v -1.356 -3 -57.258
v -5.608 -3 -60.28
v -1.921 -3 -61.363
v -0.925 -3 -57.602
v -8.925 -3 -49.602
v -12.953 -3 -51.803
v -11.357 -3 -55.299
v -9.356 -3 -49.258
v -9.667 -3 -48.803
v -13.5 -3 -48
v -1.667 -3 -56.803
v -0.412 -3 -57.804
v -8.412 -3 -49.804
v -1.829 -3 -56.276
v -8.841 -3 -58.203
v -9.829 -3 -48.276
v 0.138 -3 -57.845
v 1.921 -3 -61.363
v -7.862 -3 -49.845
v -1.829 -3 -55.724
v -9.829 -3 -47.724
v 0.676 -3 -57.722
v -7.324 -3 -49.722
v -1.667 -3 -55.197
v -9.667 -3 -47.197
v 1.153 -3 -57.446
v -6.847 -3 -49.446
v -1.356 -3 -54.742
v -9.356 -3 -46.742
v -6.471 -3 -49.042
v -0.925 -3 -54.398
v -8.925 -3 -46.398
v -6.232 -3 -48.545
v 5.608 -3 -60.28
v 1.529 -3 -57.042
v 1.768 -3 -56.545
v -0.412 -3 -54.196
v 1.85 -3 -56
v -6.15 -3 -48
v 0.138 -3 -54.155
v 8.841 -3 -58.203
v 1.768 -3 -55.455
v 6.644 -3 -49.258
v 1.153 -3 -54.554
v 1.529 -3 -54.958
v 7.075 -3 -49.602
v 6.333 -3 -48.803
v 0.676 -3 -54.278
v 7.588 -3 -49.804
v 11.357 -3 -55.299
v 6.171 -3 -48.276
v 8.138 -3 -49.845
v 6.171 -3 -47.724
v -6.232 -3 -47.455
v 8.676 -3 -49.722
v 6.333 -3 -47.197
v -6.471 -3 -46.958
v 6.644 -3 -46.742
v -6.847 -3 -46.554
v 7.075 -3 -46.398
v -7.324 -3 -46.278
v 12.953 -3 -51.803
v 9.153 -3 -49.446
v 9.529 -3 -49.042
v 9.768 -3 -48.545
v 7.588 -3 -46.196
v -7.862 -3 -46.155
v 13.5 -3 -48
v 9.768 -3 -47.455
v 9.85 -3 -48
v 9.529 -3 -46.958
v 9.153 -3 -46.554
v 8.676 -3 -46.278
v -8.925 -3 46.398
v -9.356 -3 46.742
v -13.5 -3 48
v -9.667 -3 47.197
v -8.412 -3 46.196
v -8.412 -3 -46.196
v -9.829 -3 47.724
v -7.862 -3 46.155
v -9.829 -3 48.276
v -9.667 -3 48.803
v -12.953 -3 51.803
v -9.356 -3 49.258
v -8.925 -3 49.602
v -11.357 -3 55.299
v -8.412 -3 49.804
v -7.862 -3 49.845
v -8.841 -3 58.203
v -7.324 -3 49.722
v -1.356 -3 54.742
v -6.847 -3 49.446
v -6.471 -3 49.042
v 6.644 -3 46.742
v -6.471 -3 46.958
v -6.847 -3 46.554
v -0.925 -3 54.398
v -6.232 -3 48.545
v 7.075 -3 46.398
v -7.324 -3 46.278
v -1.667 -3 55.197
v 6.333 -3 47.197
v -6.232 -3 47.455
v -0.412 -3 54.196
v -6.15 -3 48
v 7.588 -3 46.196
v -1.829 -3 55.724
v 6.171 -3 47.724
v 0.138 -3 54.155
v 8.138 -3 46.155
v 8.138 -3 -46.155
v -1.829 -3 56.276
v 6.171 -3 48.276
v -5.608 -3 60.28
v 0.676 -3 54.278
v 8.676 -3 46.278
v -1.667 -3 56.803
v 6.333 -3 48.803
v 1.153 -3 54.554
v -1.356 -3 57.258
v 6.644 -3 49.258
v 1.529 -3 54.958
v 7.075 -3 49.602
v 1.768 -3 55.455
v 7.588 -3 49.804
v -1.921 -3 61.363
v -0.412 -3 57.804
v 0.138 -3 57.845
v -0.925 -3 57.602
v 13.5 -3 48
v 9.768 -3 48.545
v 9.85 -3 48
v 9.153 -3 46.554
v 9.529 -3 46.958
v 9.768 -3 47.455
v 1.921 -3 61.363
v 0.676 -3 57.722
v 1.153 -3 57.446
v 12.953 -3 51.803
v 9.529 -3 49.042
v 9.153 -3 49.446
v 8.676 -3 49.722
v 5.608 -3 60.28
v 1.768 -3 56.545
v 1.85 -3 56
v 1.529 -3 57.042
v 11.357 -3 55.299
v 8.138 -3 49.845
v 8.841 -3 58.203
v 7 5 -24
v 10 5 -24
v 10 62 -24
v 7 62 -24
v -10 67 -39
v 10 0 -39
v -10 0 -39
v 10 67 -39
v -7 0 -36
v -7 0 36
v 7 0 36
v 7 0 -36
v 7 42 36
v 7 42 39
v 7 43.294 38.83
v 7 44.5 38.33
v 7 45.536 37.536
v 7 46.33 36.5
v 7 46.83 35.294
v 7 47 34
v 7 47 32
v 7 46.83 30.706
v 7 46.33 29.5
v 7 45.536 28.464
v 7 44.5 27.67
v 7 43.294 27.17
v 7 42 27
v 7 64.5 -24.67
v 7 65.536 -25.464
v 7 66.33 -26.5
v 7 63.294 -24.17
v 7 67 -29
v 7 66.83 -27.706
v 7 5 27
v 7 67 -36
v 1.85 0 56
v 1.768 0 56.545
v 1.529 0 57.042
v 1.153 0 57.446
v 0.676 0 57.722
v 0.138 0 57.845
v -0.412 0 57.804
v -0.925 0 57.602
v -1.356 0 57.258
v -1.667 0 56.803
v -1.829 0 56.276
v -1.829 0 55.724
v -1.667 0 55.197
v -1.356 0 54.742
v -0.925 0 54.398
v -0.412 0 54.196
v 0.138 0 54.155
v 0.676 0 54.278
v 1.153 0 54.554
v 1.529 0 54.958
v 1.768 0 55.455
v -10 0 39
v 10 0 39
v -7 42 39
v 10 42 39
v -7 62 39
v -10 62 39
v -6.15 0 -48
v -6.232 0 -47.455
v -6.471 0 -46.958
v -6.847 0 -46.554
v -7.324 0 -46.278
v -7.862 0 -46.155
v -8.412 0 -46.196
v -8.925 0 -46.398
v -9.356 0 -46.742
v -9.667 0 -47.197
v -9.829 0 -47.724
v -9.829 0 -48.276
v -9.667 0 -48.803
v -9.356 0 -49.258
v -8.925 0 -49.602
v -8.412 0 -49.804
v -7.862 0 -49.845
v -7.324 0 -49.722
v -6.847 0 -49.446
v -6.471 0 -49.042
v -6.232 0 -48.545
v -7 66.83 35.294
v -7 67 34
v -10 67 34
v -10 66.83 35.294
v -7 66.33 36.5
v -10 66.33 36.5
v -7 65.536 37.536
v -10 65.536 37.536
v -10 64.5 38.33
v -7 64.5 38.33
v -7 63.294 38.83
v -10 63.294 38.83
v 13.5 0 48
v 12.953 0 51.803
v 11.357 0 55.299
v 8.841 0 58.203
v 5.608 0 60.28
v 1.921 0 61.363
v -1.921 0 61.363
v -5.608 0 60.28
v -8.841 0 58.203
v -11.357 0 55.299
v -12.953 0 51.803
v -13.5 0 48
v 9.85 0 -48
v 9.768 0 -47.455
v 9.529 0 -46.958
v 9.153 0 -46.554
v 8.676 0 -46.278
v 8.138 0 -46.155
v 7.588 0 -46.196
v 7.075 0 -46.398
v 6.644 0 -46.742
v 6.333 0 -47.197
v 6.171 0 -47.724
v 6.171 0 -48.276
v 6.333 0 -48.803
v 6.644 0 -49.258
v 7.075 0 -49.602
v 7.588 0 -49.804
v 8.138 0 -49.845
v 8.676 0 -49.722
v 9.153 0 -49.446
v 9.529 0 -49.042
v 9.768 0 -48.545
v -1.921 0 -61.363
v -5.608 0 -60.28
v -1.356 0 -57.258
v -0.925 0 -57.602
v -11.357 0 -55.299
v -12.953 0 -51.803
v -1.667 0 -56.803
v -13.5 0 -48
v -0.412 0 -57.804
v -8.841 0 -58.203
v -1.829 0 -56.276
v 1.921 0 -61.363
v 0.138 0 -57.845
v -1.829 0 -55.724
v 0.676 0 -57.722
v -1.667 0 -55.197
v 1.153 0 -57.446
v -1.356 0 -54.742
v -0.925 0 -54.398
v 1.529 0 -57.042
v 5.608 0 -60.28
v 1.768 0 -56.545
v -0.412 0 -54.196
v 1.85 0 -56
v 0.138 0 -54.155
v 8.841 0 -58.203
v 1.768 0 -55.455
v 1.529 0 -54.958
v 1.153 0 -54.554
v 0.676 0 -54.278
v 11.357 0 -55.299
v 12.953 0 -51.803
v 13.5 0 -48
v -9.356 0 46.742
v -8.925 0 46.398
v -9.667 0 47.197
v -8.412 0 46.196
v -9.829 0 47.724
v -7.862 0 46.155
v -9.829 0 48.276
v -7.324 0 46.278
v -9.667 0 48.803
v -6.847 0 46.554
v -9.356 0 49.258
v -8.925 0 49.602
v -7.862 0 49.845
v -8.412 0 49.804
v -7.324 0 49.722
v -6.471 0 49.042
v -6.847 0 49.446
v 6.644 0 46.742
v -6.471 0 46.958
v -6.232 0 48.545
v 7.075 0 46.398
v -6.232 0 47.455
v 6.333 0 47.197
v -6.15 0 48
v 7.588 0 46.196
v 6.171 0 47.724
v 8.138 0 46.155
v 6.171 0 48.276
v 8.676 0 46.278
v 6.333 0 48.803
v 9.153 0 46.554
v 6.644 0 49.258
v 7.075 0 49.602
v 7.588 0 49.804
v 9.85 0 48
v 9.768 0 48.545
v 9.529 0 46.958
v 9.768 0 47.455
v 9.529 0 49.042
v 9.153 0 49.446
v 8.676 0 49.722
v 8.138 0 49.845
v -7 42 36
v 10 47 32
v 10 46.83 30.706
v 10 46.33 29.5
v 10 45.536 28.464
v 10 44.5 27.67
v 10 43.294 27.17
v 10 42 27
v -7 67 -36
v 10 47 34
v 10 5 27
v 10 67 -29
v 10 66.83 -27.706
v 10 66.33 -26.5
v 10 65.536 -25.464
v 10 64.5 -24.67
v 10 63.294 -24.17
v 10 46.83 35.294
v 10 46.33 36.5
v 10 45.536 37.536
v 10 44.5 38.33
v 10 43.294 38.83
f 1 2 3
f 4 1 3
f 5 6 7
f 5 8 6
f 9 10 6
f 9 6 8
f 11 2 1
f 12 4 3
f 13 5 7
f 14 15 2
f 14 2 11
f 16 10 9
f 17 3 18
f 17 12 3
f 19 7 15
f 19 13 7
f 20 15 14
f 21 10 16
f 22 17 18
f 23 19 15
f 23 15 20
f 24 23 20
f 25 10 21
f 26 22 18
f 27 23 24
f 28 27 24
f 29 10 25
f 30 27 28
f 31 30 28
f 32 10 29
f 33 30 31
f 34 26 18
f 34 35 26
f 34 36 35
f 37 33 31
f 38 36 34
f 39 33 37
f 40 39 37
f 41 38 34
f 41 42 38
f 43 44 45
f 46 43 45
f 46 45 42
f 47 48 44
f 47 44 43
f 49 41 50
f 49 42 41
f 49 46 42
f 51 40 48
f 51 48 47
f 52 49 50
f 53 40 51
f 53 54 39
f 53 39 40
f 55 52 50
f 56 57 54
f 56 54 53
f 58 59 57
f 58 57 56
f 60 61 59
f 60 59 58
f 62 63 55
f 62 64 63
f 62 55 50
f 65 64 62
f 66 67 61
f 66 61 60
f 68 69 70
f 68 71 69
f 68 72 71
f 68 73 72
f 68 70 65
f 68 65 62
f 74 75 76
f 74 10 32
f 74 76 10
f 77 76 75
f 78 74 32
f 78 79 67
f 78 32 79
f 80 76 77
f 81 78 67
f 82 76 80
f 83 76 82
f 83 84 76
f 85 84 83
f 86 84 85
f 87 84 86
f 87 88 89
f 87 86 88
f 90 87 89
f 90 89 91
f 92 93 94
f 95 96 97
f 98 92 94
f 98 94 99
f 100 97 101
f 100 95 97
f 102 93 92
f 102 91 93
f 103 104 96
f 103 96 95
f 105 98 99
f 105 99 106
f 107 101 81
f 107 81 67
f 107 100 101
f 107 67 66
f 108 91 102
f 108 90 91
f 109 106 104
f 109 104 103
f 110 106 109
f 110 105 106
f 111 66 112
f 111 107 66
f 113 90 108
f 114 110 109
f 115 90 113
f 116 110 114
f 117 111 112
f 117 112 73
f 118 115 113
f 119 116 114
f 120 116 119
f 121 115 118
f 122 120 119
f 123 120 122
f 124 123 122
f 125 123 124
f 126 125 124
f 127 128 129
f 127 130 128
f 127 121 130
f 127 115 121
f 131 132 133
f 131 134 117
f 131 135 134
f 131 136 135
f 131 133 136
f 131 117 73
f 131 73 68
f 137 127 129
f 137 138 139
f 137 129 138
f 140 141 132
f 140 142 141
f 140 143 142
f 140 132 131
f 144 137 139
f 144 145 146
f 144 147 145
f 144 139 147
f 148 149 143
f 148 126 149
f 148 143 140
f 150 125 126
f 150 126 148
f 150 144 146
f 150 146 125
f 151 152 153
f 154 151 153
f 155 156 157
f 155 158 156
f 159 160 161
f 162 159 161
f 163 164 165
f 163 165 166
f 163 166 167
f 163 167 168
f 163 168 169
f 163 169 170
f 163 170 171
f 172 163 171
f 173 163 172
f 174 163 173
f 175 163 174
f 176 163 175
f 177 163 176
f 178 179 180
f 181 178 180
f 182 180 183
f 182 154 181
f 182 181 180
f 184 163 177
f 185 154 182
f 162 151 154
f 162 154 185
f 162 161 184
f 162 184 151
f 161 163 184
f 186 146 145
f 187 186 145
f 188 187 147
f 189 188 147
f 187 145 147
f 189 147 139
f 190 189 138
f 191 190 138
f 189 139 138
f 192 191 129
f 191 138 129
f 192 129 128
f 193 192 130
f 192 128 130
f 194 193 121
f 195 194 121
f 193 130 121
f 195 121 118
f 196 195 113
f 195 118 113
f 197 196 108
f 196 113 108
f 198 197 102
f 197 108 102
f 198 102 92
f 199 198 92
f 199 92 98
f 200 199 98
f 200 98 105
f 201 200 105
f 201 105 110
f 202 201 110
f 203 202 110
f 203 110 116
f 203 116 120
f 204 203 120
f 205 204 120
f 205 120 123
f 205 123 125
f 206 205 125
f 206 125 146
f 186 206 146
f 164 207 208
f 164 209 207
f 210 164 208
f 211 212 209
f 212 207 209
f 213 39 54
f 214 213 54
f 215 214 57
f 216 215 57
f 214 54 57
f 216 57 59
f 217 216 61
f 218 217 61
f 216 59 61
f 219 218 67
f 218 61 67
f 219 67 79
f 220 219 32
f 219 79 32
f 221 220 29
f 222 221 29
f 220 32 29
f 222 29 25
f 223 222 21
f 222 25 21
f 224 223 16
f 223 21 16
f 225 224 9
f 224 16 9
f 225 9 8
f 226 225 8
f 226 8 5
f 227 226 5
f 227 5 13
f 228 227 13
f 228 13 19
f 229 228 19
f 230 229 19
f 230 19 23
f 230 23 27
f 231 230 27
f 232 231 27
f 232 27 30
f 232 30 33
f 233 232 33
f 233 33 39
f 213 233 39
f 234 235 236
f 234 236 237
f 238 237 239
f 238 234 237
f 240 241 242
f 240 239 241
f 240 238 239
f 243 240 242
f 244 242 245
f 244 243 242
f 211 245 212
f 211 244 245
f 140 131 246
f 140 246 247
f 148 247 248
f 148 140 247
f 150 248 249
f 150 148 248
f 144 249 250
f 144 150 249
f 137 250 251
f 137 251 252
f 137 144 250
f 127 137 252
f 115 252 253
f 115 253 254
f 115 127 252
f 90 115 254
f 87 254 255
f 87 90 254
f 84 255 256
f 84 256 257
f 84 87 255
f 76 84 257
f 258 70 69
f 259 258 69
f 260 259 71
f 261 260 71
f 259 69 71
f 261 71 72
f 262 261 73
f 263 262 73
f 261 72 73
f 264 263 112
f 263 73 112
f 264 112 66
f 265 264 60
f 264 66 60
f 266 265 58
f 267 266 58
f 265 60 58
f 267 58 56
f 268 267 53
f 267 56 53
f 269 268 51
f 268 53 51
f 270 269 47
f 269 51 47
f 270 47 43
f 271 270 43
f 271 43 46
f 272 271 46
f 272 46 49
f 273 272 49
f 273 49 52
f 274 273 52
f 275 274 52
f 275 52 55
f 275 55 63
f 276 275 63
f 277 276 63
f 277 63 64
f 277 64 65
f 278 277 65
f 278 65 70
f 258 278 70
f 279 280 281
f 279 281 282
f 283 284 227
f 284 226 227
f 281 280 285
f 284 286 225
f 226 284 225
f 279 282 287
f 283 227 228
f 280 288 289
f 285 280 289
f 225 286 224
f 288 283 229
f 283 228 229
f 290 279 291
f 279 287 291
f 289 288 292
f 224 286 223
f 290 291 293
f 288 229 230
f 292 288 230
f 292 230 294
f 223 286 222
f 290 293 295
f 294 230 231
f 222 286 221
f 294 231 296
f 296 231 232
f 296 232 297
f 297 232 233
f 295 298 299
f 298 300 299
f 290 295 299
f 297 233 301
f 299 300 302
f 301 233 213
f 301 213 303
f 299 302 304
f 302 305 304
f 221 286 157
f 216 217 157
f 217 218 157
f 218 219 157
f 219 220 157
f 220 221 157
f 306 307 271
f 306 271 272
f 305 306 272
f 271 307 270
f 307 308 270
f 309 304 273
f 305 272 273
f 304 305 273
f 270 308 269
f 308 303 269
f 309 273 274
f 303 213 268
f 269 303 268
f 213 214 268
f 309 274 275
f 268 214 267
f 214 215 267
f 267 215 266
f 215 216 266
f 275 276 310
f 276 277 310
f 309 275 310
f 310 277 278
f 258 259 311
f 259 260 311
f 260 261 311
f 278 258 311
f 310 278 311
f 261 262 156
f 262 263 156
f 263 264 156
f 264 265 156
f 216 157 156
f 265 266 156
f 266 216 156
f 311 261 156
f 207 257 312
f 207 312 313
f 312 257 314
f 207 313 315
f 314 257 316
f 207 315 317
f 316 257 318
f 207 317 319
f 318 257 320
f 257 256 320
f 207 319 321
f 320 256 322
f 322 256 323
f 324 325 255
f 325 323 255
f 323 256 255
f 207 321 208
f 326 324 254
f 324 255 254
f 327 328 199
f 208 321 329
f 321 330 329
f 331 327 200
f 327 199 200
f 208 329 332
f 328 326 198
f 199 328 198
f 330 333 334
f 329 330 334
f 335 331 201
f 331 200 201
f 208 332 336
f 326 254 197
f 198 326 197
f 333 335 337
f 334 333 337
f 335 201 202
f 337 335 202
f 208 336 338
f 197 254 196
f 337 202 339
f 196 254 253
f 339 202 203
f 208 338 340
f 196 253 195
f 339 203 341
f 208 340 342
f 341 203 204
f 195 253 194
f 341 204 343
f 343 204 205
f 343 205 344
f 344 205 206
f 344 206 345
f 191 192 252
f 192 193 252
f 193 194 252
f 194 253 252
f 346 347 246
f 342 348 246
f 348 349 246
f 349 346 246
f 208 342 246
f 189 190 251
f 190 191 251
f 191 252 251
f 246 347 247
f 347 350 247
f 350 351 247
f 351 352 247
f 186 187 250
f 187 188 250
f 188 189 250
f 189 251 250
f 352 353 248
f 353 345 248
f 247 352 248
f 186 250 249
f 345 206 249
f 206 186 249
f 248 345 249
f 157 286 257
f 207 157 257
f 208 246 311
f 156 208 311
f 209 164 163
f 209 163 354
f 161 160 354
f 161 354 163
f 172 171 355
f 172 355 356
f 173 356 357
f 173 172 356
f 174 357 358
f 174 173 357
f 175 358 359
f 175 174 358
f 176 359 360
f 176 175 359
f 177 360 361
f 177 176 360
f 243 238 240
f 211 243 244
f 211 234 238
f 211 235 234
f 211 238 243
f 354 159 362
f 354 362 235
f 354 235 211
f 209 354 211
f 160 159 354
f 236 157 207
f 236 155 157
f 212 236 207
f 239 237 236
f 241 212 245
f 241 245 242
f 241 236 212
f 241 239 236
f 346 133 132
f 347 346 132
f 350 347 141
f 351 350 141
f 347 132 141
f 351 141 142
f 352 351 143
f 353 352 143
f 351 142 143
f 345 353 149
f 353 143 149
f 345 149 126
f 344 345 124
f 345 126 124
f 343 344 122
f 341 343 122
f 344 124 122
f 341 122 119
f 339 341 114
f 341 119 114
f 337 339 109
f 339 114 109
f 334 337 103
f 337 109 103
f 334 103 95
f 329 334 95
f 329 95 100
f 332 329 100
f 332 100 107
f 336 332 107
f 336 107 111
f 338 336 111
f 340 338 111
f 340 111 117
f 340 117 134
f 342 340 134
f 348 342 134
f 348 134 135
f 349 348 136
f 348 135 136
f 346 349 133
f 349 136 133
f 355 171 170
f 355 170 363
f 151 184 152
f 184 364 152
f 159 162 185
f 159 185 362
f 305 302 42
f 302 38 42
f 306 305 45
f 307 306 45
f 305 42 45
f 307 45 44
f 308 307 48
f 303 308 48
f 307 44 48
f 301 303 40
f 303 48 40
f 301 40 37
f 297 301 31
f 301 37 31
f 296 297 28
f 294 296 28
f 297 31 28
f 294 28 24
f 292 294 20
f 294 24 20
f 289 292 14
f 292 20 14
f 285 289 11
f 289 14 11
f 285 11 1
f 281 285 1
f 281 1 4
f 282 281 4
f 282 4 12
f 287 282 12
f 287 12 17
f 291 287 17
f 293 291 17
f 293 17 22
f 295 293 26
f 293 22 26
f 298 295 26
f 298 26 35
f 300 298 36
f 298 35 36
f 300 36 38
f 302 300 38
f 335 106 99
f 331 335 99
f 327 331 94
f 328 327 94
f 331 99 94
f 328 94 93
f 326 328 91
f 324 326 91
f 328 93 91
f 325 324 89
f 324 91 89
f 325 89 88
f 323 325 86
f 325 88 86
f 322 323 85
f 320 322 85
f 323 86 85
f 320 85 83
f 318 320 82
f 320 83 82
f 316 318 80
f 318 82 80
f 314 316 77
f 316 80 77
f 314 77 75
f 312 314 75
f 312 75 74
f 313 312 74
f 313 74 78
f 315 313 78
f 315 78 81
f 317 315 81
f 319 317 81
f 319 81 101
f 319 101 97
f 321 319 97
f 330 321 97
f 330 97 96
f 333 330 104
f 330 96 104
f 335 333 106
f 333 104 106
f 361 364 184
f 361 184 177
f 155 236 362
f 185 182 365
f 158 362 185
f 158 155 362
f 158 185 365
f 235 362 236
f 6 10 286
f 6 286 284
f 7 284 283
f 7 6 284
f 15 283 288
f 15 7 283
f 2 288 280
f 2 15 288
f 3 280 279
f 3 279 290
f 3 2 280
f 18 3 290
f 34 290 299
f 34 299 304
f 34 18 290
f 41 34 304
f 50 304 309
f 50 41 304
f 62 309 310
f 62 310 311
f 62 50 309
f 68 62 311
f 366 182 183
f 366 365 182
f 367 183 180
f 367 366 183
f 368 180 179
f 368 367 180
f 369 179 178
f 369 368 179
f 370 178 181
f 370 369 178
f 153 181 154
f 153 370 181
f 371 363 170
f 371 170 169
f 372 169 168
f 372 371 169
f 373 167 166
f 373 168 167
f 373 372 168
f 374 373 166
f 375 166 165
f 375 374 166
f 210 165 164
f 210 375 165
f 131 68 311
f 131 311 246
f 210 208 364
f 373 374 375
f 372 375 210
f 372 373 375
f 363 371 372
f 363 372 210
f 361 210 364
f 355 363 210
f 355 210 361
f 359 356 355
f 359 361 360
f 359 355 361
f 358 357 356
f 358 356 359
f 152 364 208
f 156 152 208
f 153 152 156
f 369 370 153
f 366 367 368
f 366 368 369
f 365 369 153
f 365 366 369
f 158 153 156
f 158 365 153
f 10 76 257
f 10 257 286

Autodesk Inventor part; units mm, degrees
ref_plane "YZ Plane" through (0, 0, 0) normal (1, 0, 0) x (0, 1, 0)
ref_plane "XZ Plane" through (0, 0, 0) normal (0, 1, 0) x (-1, 0, 0)
ref_plane "XY Plane" through (0, 0, 0) normal (0, 0, 1) x (1, 0, 0)
sketch "Sketch1" plane through (0, 0, 0) normal (0, 1, 0) x (-1, 0, 0)
  line L0 (-7, -36) -> (7, -36)
  line L1 (7, -36) -> (7, 36)
  line L2 (7, 36) -> (-7, 36)
  line L3 (-7, 36) -> (-7, -36)
  line L4 (-7, -36) -> (7, 36) construction
  line L5 (7, -36) -> (-7, 36) construction
  line L6 (-10, -39) -> (10, -39)
  line L7 (10, -39) -> (10, 39)
  line L8 (10, 39) -> (-10, 39)
  line L9 (-10, 39) -> (-10, -39)
  line L10 (-10, -39) -> (10, 39) construction
  line L11 (10, -39) -> (-10, 39) construction
  point P0 (0, 0)
  dimension "d0" = 14
  dimension "d1" = 72
  dimension "d2" = 20
  dimension "d3" = 78
extrude "Extrusion1" add sketch "Sketch1" along normal blind 42
sketch "Sketch2" plane through (10, 0, 39) normal (1, 0, 0) x (0, 0, -1)
  line L0 (78, 42) -> (0, 42) projected
  line L1 (12, 5) -> (63, 5)
  line L2 (12, 5) -> (12, 42)
  line L3 (63, 5) -> (63, 42)
  point P0 (39, 0)
  point P1 (39, 42)
  dimension "d6" = 78
  dimension "d7" = 51
extrude "Extrusion2" cut sketch "Sketch2" against normal blind 10
sketch "Sketch3" plane through (0, 42, 0) normal (0, 1, 0) x (1, 0, 0)
  line L0 (-10, 39) -> (-10, -39) projected
  line L1 (10, 39) -> (-10, 39) projected
  line L2 (10, 24) -> (10, 39) projected
  line L3 (-7, 36) -> (7, 36) projected
  line L4 (7, 36) -> (7, 24) projected
  line L5 (7, 24) -> (10, 24) projected
  line L6 (10, -39) -> (10, -27) projected
  line L7 (10, -27) -> (7, -27) projected
  line L8 (-7, 36) -> (-7, -36) projected
  line L9 (-7, -39) -> (-7, 36)
  line L10 (-10, -39) -> (-7, -39)
  line L11 (7, -39) -> (7, -27)
  line L12 (10, -39) -> (7, -39)
  point P0 (0, 0)
extrude "Extrusion3" add sketch "Sketch3" along normal blind 25
sketch "Sketch4" plane through (0, 0, 0) normal (0, -1, 0) x (1, 0, 0)
  line L0 (10, 39) -> (10, -39) projected
  line L1 (-10, 39) -> (10, 39) projected
  line L2 (-10, -39) -> (-10, 39) projected
  line L3 (10, -39) -> (-10, -39) projected
  point P0 (0, 0)
extrude "Extrusion4" add sketch "Sketch4" along normal blind 3
sketch "Sketch5" plane through (0, -3, 0) normal (0, -1, 0) x (1, 0, 0)
  circle A0 centre (-8, -48) radius 1.85
  circle A1 centre (0, -56) radius 1.85
  circle A2 centre (8, -48) radius 1.85 construction
  circle A3 centre (-8, 48) radius 1.85
  circle A4 centre (0, 56) radius 1.85
  circle A5 centre (8, 48) radius 1.85
  arc A6 (-13.5, -48) -> (13.5, -48) centre (0, -48) ccw
  circle A7 centre (8, -48) radius 1.85
  arc A8 (13.5, 48) -> (-13.5, 48) centre (0, 48) ccw
  line L0 (13.5, -48) -> (13.5, 48)
  line L1 (-13.5, 48) -> (-13.5, -48)
  point P0 (0, 0)
extrude "Extrusion5" add sketch "Sketch5" against normal blind 3
sketch "Sketch6" plane through (0, 67, 0) normal (0, 1, 0) x (1, 0, 0)
  line L0 (10, -39) -> (10, -27) projected
  line L1 (10, -27) -> (7, -27) projected
  line L2 (7, -27) -> (7, -39) projected
  line L3 (7, -39) -> (10, -39) projected
  point P0 (0, 0)
extrude "Extrusion6" cut sketch "Sketch6" against normal blind 20
fillet "Fillet1" radius 5 4 edges at (8.5, 47, 27) (8.5, 67, -24) (-8.5, 67, 39) (8.5, 47, 39)
properties part number "Phone Mount 2"
